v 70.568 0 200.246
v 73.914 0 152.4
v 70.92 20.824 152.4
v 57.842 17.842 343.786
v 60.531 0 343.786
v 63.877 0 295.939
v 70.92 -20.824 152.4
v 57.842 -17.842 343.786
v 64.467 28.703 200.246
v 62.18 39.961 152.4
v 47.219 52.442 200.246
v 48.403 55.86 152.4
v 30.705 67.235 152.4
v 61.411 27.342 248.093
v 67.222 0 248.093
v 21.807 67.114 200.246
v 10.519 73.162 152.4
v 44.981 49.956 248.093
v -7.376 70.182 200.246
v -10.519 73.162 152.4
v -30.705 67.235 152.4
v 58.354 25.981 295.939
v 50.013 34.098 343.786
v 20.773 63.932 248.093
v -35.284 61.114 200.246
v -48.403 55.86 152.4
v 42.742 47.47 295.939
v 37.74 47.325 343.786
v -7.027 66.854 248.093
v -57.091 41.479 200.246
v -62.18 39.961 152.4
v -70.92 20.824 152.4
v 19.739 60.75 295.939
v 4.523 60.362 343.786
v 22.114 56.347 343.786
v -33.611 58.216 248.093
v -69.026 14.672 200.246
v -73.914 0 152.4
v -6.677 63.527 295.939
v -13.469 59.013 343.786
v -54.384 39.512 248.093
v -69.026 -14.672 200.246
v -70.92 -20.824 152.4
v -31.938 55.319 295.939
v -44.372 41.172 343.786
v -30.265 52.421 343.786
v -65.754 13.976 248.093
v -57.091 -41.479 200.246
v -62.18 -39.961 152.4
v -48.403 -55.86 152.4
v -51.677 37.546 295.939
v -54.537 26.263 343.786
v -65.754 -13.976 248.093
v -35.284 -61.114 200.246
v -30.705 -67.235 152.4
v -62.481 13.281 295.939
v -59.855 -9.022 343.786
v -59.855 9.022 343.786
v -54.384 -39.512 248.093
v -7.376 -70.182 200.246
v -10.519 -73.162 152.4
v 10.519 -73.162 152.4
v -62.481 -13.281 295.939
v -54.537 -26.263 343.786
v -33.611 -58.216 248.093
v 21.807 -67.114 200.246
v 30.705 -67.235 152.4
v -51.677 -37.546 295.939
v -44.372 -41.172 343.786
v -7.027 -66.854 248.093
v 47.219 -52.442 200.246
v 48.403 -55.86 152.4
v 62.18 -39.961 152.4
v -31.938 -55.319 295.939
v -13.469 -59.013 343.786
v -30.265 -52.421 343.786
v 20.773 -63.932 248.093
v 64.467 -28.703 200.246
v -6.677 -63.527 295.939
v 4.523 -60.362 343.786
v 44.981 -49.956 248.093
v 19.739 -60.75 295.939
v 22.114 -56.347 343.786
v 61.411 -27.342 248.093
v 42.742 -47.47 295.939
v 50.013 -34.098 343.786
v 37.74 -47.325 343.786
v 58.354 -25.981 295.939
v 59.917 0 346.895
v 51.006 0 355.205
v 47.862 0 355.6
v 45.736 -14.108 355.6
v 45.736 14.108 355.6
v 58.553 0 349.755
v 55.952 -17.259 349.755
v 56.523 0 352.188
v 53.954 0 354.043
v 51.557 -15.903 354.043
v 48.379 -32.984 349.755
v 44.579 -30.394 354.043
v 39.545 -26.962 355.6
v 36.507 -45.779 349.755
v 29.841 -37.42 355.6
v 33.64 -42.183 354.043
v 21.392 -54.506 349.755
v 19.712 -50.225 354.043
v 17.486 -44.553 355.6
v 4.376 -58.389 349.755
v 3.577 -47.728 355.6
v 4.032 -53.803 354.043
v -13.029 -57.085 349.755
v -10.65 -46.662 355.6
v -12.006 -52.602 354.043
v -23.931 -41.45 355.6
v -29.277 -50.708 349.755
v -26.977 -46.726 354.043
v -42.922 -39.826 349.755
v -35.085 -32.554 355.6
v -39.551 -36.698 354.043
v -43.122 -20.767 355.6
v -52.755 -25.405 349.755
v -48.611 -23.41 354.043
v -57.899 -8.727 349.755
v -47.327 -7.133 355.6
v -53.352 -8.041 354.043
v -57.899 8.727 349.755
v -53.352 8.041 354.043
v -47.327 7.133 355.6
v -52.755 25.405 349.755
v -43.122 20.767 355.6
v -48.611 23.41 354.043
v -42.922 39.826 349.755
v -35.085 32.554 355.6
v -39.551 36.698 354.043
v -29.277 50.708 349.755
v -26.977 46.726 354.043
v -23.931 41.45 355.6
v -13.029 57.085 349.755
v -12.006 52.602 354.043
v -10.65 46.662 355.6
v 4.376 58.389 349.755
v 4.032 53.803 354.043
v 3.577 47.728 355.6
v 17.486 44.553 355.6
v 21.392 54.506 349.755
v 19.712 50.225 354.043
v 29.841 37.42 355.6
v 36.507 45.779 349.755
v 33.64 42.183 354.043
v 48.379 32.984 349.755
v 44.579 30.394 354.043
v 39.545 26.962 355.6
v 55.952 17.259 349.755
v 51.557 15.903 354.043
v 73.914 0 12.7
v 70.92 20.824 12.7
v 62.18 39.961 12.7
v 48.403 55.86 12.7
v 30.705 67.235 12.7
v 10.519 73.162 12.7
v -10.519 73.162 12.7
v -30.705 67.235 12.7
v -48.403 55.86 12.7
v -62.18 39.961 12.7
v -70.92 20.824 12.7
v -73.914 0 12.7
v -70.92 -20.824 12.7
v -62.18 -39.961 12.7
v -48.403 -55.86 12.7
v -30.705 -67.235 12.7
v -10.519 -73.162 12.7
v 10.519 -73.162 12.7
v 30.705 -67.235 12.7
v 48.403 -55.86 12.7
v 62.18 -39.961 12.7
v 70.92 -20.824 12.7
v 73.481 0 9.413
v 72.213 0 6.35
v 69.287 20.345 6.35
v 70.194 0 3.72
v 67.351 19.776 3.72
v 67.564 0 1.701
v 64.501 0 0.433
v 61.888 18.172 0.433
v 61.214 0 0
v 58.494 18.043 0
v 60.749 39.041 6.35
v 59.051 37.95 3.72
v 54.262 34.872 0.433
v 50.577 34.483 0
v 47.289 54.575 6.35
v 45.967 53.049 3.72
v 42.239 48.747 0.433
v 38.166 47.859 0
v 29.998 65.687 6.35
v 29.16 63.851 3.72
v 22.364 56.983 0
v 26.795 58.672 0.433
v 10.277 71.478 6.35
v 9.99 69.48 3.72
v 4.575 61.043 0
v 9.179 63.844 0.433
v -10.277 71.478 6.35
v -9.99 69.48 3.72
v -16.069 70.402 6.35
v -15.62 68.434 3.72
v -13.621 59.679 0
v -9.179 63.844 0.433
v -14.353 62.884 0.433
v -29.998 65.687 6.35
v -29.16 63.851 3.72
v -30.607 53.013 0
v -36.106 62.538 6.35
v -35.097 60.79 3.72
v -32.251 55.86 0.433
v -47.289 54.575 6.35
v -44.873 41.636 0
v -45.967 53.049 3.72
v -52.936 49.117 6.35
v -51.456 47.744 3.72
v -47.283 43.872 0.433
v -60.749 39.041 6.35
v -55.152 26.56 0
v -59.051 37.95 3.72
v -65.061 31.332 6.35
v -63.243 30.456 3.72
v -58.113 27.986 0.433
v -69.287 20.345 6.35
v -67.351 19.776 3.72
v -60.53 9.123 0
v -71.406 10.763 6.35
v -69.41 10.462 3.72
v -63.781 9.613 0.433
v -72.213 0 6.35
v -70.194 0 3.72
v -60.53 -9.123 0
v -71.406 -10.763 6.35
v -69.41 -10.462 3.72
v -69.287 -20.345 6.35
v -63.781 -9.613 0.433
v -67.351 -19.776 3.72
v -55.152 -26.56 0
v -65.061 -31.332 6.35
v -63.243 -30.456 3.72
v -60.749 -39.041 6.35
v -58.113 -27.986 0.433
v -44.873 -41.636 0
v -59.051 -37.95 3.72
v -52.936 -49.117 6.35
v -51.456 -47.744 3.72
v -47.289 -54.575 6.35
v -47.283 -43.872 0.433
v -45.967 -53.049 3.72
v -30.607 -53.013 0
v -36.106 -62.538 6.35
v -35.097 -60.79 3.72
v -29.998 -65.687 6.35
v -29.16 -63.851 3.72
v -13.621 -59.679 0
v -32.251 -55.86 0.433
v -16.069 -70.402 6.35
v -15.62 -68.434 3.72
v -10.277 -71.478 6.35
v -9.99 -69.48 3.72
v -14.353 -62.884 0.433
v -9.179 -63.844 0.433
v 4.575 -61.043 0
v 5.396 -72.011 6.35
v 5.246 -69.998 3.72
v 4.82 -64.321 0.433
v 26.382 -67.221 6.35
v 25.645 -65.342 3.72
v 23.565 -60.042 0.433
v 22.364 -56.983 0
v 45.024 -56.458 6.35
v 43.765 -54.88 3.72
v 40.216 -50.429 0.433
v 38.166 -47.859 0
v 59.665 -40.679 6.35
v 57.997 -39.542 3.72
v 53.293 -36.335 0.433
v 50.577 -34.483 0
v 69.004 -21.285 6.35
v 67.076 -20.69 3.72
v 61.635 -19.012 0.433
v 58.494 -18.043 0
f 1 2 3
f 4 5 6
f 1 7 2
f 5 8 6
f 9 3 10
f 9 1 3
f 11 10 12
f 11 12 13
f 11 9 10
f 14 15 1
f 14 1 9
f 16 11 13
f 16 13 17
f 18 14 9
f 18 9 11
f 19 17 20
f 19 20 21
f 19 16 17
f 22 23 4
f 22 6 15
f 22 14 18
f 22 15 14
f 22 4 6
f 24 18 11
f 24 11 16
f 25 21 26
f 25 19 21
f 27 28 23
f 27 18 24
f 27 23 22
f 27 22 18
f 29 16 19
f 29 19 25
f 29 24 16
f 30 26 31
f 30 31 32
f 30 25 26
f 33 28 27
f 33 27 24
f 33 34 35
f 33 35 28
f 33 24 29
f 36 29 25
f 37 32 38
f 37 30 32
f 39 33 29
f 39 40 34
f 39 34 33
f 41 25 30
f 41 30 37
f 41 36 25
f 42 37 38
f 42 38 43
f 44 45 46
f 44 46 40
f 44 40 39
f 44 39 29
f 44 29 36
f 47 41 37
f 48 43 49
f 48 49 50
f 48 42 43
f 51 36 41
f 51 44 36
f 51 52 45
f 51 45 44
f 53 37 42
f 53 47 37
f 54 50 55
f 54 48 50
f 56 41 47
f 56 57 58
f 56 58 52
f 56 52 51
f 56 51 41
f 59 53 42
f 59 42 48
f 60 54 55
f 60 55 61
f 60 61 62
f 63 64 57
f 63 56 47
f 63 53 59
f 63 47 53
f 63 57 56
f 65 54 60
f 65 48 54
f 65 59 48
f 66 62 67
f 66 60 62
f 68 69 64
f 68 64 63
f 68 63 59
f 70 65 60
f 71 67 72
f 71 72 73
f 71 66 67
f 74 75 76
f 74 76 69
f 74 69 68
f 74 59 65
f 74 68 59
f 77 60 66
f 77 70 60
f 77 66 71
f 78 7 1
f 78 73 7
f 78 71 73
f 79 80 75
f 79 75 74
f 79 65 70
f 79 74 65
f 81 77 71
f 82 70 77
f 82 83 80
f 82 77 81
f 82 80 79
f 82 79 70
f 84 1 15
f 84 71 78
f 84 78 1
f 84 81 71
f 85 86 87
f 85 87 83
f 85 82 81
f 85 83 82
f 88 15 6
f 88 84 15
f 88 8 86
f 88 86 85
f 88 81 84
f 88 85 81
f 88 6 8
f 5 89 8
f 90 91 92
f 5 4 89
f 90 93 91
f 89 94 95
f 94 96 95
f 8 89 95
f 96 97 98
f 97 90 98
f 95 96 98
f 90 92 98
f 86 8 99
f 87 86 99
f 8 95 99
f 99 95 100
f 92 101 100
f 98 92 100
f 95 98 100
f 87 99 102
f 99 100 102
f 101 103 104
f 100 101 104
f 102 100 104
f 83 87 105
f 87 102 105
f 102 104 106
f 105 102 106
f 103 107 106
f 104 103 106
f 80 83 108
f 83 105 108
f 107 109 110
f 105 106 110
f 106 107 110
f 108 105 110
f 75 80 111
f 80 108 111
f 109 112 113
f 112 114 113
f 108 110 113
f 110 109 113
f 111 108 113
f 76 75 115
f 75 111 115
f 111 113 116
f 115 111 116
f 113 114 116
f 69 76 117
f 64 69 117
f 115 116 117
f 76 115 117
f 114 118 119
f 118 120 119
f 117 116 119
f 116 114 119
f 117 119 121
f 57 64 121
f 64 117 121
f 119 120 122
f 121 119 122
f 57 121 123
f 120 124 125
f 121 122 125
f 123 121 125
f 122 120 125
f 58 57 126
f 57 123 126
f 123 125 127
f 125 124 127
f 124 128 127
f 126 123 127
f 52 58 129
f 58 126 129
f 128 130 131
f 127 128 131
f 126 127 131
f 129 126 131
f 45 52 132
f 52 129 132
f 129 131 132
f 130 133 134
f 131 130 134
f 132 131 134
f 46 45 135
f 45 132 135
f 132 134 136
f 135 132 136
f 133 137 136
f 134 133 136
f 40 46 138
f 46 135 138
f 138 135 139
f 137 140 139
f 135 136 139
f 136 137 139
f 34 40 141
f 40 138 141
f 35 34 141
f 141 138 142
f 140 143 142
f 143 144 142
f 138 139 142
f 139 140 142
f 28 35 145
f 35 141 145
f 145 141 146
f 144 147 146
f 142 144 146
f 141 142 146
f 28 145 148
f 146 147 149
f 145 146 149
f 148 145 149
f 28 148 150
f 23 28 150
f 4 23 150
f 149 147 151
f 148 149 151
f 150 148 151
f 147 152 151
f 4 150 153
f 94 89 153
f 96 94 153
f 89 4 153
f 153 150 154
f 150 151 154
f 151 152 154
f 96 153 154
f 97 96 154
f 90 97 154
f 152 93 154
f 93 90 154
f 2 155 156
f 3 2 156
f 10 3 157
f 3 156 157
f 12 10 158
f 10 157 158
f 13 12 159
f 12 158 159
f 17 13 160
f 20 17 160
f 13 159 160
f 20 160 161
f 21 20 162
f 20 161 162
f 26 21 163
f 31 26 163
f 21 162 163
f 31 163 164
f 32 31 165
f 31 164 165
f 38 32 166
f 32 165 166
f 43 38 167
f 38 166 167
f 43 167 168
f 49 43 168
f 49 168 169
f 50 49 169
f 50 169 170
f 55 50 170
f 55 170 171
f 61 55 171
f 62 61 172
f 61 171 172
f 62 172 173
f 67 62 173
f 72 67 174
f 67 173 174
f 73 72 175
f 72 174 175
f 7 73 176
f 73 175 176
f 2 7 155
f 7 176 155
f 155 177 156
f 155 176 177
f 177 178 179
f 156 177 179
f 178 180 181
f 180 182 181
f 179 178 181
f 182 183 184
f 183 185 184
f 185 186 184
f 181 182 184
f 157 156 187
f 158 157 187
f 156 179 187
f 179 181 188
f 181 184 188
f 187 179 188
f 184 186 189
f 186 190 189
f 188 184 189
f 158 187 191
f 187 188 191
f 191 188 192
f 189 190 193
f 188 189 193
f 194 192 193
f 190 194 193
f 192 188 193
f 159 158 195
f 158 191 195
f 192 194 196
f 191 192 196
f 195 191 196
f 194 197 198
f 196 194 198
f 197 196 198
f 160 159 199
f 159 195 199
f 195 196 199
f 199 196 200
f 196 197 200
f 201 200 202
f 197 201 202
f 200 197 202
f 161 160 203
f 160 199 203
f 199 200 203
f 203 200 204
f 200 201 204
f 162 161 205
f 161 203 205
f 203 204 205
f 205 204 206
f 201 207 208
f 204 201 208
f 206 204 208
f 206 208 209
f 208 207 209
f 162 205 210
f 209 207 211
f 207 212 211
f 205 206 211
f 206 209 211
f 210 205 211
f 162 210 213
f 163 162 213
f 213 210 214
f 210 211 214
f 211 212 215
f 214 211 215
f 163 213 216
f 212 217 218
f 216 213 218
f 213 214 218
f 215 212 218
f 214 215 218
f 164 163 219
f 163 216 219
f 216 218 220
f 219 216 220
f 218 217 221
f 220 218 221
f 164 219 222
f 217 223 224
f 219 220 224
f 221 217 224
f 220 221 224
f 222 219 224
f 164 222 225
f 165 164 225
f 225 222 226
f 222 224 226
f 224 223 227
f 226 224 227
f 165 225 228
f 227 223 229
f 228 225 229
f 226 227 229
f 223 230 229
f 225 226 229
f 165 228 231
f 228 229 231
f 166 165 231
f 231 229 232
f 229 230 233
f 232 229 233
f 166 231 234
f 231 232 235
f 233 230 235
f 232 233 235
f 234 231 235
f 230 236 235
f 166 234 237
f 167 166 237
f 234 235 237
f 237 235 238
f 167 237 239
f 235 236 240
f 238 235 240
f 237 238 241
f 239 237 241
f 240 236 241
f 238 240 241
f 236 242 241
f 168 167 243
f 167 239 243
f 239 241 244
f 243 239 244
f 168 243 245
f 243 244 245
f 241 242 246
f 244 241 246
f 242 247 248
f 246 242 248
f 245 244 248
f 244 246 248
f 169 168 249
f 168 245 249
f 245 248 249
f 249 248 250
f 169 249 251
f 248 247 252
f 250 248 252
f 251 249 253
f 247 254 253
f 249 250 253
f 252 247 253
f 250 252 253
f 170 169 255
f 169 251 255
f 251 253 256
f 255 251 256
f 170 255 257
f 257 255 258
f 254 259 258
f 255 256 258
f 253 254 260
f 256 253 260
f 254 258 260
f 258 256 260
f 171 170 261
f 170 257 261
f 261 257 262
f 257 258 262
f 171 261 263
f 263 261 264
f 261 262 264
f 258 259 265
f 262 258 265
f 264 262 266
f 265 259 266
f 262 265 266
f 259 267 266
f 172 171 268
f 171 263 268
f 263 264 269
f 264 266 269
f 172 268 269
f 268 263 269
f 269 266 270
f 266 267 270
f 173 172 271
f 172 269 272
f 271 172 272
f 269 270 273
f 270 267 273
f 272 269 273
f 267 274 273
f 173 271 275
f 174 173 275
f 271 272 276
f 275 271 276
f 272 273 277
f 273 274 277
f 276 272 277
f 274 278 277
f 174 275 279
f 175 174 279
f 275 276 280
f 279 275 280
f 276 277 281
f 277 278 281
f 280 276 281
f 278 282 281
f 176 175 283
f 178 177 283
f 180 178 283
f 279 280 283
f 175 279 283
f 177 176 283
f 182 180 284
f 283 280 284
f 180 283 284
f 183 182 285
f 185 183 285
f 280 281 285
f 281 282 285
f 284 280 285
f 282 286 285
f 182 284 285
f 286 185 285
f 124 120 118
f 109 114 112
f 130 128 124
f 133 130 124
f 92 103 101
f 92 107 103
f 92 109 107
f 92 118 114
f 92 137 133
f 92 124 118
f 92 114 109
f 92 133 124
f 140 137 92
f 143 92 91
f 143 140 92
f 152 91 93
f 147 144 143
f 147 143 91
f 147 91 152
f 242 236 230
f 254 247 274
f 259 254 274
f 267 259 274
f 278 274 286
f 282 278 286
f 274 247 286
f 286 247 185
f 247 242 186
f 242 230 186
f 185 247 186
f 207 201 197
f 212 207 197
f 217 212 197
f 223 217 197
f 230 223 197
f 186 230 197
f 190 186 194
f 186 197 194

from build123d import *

# Parameters (mm, degrees)
SKETCH1_R           = 73.914
BOSS_EXTRUDE1_DEPTH = 152.4
SKETCH2_R           = 73.914
BOSS_EXTRUDE2_DEPTH = 203.2
BOSS_EXTRUDE2_TAPER = 4
FILLET1_R           = 12.7


with BuildPart() as part:
    # Sketch1 → Boss-Extrude1 (new body)
    with BuildSketch(Plane.XY):
        Circle(SKETCH1_R)
    extrude(amount=BOSS_EXTRUDE1_DEPTH)

    # Sketch2 → Boss-Extrude2 (add)
    with BuildSketch(Plane.XY.offset(152.4)):
        Circle(SKETCH2_R)
    extrude(amount=BOSS_EXTRUDE2_DEPTH, taper=BOSS_EXTRUDE2_TAPER)

    # Fillet1
    fillet1_edges = [part.edges().sort_by_distance(p)[0] for p in [
        (-73.914, 0, 0),
        (-59.704871813, 0, 355.6),
    ]]
    fillet(fillet1_edges, radius=FILLET1_R)


solid = part.part
